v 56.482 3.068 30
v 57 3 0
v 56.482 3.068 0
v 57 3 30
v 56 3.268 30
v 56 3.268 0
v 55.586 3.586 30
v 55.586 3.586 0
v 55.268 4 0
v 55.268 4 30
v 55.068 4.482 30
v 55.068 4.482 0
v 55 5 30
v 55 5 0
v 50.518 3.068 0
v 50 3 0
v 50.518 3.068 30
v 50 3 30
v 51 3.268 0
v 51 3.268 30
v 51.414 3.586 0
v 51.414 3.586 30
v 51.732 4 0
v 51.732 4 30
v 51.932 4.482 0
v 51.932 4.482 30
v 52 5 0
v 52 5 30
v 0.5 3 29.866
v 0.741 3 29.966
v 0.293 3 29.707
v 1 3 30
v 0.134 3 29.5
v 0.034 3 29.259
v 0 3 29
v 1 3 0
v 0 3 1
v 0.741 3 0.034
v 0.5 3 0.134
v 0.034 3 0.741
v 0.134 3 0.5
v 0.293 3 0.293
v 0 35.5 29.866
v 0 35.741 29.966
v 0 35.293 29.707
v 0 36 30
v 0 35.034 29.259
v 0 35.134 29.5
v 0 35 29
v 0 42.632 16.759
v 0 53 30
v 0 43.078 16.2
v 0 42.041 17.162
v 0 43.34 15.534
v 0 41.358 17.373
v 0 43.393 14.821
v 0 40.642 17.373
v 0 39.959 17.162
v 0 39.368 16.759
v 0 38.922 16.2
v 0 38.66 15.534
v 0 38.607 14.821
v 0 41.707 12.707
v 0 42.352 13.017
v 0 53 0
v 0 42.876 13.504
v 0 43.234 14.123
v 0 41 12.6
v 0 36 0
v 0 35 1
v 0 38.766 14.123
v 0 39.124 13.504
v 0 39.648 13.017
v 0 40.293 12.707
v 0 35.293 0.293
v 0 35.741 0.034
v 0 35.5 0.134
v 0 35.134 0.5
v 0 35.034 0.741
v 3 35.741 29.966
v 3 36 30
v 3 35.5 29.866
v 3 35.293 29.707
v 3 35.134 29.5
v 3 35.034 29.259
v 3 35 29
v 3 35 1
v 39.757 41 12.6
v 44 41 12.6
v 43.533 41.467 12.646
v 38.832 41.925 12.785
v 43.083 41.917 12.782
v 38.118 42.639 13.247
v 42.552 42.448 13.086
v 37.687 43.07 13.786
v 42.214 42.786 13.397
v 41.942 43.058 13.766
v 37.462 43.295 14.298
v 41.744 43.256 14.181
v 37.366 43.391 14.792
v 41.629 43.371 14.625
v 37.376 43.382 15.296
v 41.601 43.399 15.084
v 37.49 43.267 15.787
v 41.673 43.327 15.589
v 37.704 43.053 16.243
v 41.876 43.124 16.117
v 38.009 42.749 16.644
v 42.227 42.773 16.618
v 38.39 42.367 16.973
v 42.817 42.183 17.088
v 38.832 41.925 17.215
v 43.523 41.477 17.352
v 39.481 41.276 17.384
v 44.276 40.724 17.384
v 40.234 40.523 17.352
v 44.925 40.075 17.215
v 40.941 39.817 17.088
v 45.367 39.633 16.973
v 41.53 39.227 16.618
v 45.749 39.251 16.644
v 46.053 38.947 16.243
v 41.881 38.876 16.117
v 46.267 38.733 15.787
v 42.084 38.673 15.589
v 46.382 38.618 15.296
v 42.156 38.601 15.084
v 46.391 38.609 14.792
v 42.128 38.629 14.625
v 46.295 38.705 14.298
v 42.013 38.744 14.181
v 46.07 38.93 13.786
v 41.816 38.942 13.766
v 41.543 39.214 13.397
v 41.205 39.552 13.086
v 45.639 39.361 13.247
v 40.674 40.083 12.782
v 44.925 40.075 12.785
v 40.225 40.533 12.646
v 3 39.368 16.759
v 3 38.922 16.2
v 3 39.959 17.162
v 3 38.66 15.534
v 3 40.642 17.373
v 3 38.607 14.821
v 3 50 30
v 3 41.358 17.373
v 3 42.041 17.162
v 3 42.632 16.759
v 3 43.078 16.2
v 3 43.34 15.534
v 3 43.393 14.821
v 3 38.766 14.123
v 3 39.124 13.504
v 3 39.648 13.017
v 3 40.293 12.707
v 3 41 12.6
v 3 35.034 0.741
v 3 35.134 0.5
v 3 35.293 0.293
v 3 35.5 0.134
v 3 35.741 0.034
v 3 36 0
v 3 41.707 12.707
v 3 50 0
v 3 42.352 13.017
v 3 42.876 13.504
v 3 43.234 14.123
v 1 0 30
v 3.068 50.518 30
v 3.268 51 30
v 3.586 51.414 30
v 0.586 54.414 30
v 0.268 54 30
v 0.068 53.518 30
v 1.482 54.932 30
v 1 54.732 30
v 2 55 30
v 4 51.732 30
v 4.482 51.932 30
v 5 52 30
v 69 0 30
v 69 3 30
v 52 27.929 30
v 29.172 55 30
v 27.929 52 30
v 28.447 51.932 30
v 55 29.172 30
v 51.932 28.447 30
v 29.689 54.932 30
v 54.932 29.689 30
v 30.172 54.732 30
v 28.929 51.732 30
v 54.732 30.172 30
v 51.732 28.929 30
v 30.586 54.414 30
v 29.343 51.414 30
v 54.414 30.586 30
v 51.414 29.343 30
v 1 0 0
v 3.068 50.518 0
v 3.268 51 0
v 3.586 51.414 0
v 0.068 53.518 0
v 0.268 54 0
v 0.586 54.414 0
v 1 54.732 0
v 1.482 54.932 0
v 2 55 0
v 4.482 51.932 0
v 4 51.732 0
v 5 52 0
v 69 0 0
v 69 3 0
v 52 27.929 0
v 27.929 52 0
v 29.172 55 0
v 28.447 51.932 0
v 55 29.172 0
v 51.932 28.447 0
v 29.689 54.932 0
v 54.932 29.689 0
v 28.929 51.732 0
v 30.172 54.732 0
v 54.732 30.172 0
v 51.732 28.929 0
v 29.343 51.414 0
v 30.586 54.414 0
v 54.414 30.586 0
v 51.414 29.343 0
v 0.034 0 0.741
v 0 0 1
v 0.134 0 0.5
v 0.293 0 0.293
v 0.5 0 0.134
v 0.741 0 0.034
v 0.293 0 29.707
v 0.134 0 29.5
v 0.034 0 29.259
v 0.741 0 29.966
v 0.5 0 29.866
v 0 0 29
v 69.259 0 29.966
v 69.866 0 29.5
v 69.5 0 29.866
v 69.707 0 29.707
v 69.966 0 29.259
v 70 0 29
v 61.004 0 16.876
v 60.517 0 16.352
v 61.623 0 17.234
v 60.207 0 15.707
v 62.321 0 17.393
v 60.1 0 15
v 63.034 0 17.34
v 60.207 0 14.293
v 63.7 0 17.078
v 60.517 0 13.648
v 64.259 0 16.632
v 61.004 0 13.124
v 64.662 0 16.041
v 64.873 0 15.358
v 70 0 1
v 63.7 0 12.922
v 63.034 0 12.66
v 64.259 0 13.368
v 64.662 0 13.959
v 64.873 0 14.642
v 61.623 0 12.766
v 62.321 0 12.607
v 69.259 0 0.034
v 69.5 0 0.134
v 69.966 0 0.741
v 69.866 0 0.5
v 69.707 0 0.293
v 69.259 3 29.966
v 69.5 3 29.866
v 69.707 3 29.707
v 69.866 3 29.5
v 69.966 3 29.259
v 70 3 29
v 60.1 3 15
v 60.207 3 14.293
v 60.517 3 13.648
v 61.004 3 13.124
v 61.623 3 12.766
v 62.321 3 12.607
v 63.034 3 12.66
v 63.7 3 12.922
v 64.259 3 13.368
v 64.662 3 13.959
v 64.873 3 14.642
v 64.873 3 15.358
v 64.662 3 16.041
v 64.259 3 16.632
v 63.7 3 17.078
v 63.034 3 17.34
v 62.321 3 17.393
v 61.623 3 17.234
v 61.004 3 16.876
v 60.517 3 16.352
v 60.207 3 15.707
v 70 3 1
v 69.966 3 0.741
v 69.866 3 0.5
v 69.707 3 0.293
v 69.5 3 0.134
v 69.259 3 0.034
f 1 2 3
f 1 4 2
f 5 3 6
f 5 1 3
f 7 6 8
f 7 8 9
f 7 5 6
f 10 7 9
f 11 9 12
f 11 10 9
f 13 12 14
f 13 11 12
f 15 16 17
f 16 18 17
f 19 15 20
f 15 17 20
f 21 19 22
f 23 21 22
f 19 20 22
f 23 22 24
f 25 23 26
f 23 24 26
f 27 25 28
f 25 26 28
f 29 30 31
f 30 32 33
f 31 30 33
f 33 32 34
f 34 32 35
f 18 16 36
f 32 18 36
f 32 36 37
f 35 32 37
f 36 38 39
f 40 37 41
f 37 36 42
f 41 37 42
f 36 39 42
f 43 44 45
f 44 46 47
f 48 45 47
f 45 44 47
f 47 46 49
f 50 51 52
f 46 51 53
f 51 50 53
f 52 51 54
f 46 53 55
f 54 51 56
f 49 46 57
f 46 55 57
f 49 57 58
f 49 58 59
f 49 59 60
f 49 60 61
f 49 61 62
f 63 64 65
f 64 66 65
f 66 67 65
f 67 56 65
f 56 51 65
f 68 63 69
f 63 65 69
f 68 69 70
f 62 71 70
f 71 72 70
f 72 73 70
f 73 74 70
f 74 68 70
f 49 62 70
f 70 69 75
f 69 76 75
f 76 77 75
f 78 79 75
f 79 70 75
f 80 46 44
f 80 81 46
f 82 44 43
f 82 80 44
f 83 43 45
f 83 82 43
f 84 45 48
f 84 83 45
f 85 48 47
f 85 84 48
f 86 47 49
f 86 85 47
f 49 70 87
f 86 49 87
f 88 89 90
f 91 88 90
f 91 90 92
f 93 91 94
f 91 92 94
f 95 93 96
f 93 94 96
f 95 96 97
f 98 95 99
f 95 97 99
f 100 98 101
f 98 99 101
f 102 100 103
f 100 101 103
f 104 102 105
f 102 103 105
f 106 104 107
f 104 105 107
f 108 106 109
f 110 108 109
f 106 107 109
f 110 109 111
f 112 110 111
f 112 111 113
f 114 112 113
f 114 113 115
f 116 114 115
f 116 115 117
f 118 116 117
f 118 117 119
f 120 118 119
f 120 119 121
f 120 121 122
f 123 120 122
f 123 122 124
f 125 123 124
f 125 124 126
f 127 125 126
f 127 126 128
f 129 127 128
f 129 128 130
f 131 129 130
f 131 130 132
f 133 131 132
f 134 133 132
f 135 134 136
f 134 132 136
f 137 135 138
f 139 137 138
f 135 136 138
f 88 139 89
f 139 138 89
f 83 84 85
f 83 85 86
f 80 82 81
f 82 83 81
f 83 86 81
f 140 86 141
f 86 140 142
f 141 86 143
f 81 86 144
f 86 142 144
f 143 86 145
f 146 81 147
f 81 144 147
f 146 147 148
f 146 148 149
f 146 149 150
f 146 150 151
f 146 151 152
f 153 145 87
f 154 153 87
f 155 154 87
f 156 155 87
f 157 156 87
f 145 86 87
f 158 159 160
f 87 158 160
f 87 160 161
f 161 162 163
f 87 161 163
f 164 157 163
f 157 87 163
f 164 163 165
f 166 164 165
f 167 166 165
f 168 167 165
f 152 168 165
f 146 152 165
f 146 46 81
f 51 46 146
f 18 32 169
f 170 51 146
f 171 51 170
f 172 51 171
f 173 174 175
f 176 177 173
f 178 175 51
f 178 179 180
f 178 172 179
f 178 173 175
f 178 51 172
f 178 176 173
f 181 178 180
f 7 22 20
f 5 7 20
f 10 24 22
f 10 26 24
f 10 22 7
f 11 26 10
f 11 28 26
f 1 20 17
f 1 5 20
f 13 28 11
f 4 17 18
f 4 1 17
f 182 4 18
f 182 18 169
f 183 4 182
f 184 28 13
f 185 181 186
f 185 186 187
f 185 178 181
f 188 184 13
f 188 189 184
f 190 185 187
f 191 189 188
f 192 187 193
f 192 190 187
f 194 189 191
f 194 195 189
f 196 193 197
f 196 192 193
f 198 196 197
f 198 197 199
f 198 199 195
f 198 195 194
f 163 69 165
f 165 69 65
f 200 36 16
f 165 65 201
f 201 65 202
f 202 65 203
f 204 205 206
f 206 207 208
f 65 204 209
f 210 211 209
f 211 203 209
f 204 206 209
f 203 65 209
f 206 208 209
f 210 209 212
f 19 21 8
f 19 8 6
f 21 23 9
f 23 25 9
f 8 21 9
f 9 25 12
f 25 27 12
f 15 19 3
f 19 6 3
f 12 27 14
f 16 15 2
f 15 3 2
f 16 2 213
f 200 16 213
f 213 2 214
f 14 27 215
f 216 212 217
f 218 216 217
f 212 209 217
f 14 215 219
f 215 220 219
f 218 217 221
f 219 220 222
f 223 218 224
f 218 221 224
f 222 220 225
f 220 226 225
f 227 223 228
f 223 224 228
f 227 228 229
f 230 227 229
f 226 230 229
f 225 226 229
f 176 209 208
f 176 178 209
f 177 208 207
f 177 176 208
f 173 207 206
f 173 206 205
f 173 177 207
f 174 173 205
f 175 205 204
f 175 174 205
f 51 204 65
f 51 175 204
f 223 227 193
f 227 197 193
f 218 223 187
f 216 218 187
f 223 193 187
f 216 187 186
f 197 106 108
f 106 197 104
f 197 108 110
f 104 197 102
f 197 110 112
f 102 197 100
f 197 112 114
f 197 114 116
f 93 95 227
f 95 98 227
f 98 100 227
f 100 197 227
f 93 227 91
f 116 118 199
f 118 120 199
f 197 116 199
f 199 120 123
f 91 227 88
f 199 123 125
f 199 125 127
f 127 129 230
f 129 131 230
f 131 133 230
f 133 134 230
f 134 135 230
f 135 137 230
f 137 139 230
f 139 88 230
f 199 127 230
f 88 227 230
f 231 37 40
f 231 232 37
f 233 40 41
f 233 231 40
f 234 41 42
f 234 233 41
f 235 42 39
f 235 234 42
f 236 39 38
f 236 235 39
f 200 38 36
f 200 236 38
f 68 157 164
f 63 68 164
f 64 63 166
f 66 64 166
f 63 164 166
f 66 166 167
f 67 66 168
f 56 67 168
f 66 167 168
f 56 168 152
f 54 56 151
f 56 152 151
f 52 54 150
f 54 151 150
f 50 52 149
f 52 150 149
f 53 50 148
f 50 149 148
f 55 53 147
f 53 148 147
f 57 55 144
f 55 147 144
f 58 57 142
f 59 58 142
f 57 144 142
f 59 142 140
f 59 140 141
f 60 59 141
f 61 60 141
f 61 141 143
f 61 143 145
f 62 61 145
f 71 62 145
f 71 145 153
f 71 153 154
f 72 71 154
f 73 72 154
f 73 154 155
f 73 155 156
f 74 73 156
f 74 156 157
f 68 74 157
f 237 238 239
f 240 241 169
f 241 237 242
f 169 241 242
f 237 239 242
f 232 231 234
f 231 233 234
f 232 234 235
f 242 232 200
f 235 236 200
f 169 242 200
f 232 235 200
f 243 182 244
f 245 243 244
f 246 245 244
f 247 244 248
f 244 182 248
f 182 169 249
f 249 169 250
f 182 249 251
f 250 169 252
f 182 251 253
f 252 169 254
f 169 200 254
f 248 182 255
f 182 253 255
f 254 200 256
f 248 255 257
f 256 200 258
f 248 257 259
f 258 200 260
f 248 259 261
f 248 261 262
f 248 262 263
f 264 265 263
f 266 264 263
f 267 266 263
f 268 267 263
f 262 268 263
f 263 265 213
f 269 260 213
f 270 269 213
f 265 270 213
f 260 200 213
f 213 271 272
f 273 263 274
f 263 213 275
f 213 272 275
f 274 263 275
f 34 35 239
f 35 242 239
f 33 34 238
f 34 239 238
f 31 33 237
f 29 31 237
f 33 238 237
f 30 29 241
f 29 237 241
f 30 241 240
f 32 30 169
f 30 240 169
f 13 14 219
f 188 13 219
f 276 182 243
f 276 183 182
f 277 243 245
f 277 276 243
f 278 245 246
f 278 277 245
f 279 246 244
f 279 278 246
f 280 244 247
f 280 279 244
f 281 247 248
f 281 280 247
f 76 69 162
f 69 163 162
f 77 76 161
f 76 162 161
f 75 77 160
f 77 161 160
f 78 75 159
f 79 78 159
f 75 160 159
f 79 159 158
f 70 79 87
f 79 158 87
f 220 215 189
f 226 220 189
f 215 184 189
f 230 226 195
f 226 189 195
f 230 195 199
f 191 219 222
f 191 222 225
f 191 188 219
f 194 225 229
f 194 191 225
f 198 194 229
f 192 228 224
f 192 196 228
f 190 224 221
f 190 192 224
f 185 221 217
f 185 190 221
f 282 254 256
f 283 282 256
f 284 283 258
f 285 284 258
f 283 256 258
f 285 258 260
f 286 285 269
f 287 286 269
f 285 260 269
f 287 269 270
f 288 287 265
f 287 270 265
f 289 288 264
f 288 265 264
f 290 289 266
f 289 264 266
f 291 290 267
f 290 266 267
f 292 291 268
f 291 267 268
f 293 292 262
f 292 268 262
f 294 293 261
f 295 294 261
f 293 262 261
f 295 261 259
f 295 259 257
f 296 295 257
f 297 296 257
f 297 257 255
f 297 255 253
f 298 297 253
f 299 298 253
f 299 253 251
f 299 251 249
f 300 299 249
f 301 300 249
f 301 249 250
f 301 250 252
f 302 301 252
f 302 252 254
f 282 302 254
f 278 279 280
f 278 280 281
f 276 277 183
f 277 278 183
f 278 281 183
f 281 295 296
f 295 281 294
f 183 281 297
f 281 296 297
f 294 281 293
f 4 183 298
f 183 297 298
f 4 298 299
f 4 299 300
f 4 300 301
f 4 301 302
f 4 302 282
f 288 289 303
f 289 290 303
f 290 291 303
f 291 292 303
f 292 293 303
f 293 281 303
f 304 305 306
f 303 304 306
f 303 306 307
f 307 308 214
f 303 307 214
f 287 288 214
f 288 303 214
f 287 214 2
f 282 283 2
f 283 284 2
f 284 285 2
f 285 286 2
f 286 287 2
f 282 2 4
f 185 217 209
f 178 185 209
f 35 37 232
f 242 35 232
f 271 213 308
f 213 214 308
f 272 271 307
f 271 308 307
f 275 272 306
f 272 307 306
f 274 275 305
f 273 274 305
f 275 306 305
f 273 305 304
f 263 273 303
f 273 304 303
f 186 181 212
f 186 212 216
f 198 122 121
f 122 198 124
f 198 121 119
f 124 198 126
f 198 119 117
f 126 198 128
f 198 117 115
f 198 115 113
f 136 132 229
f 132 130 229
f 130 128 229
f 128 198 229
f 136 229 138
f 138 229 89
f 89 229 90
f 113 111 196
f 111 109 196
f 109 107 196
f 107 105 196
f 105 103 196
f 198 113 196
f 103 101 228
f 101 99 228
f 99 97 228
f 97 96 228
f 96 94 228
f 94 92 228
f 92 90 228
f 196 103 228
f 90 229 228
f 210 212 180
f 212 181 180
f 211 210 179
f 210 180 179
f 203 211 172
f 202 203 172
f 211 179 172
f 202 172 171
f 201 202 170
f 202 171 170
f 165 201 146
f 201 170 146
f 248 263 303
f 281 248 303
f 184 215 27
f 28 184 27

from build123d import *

# Parameters (mm, degrees)
EXTRUDE_THIN1_DEPTH  = 30
M4_CLEARANCE_HOLE1_D = 4.8
M4_CLEARANCE_HOLE2_D = 4.8
FILLET1_R            = 1
FILLET2_R            = 2


# Read off the part's stored shape, not the designer's step: Extrude-Thin1
with BuildPart() as part:
    # Extrude-Thin1 outline → Extrude-Thin1 (new body)
    with BuildSketch(Plane.XY):
        Polygon((0, 3), (0, 0), (70, 0), (70, 3), (55, 3), (55, 30), (30, 55), (0, 55), (0, 35), (3, 35), (3, 52), (28.757359313, 52), (52, 28.757359313), (52, 3), align=None)
    extrude(amount=EXTRUDE_THIN1_DEPTH)

    # M4 Clearance Hole1 (through all)
    with Locations(Plane.ZY):
        with Locations((15, 41)):
            Hole(M4_CLEARANCE_HOLE1_D / 2)

    # M4 Clearance Hole2 (through all)
    with Locations(Plane(origin=(0, 3, 0), x_dir=(1, 0, 0), z_dir=(0, 1, 0))):
        with Locations((62.5, -15)):
            Hole(M4_CLEARANCE_HOLE2_D / 2)

    # Fillet1
    fillet1_edges = [part.edges().sort_by_distance(p)[0] for p in [
        (1.5, 35, 0),
        (1.5, 35, 30),
        (0, 1.5, 0),
        (0, 1.5, 30),
        (70, 1.5, 0),
        (70, 1.5, 30),
    ]]
    fillet(fillet1_edges, radius=FILLET1_R)

    # Fillet2
    fillet2_edges = [part.edges().sort_by_distance(p)[0] for p in [
        (0, 55, 15),
        (30, 55, 15),
        (55, 30, 15),
        (52, 28.757359313, 15),
        (28.757359313, 52, 15),
        (3, 52, 15),
        (55, 3, 15),
        (52, 3, 15),
    ]]
    fillet(fillet2_edges, radius=FILLET2_R)


solid = part.part
